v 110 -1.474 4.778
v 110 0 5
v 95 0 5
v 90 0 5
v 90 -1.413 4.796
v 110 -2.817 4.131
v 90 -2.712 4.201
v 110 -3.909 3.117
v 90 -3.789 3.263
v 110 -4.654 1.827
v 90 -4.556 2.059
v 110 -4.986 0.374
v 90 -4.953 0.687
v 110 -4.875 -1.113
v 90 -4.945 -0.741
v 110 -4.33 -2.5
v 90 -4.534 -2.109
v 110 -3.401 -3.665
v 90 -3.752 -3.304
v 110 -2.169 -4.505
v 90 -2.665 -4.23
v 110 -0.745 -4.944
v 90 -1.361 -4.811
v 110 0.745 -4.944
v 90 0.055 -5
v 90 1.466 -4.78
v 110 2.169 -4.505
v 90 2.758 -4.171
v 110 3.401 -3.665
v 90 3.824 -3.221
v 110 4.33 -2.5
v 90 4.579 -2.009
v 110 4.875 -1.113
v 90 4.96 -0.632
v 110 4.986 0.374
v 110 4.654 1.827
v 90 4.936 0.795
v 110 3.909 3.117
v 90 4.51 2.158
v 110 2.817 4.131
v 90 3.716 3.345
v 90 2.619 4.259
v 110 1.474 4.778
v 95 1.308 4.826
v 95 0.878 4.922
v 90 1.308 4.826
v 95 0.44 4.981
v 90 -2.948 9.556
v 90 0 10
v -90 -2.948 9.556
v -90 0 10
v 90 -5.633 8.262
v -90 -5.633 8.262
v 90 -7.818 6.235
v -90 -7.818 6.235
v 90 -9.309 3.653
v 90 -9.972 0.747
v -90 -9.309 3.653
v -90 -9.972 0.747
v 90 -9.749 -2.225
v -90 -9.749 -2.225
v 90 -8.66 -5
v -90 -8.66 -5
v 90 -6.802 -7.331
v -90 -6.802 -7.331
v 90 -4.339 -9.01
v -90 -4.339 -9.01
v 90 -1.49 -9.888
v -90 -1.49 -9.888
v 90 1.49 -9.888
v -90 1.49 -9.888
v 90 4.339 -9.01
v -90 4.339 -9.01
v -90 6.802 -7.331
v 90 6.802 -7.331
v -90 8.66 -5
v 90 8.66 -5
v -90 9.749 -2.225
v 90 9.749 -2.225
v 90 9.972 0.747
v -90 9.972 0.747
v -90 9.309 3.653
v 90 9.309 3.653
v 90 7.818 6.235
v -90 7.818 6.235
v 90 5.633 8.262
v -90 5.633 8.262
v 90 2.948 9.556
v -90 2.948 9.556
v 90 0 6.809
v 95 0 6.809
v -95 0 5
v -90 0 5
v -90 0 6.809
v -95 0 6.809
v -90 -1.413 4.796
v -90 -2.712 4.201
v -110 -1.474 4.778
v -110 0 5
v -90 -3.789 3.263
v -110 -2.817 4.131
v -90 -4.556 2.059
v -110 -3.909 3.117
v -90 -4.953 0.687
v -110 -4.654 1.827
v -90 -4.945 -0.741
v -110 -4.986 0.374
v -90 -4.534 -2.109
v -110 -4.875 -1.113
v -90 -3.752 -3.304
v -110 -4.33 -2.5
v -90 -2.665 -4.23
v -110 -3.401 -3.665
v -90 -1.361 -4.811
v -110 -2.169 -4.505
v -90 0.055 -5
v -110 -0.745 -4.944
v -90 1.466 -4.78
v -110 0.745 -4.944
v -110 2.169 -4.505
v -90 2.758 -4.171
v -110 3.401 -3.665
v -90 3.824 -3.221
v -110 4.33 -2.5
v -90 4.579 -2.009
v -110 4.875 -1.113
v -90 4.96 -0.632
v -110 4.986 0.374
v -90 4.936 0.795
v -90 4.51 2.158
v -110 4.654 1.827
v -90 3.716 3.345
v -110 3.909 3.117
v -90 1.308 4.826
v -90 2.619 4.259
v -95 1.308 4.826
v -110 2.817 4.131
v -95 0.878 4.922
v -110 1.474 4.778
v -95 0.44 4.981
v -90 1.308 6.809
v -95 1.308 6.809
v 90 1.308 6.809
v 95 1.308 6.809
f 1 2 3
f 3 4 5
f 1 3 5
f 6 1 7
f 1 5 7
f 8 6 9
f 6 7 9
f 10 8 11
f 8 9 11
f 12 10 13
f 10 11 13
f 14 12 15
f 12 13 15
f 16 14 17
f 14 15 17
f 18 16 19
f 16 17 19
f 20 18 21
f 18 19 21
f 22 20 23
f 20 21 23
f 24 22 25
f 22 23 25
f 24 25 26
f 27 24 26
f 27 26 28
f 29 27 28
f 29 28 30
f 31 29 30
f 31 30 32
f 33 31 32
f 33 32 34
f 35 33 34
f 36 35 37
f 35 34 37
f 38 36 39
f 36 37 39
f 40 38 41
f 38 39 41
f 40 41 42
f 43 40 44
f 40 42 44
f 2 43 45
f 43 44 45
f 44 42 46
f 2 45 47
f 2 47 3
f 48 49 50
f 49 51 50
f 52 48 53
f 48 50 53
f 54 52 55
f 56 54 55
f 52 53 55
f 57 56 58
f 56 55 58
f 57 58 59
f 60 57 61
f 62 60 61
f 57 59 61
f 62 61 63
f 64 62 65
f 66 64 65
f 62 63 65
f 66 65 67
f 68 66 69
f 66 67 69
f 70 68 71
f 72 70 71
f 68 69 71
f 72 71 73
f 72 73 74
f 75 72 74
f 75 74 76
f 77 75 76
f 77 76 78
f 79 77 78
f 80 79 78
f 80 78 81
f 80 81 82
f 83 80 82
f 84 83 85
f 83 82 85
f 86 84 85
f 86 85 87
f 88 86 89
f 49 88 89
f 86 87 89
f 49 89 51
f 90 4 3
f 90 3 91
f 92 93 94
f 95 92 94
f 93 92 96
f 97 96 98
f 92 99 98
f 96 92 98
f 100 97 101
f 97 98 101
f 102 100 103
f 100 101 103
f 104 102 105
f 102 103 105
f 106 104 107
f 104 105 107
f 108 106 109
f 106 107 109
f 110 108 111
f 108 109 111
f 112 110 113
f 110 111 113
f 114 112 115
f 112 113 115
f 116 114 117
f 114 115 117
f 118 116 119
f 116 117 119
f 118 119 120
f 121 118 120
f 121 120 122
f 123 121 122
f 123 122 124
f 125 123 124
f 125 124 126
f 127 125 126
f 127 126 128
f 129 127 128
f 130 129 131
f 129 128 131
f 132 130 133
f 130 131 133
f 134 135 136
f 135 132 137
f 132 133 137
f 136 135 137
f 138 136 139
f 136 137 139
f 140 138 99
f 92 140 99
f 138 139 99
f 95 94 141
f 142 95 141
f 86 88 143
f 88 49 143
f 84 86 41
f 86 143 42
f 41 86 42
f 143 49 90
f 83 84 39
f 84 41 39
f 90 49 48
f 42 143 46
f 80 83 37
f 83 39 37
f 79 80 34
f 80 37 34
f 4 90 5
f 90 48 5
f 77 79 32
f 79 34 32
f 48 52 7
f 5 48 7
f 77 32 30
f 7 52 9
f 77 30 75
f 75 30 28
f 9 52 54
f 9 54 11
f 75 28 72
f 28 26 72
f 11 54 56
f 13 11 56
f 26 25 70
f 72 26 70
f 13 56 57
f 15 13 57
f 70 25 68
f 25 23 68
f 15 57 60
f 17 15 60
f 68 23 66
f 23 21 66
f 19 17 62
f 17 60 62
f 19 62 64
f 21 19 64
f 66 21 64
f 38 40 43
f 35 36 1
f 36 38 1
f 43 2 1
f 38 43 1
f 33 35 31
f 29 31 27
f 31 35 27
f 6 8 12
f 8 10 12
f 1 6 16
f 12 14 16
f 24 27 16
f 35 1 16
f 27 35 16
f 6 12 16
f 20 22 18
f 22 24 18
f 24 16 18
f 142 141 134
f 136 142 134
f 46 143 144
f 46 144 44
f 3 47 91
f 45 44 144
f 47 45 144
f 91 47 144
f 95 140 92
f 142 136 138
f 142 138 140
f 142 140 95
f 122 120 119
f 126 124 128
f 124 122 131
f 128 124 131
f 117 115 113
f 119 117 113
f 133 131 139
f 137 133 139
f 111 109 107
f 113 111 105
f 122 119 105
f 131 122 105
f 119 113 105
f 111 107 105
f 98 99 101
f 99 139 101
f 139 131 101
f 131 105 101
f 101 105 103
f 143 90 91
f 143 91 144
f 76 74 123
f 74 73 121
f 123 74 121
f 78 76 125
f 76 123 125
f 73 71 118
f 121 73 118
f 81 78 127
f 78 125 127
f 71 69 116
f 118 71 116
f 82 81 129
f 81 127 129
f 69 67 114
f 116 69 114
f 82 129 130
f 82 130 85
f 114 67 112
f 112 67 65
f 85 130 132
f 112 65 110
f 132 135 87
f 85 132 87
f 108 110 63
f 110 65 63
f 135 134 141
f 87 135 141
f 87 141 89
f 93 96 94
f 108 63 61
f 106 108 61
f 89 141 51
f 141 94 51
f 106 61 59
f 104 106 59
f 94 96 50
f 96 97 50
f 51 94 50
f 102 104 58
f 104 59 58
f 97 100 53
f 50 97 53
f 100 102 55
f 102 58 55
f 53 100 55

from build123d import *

# Parameters (mm, degrees)
BOSS_EXTRUDE1_DEPTH = 5


with BuildPart() as part:
    # Sketch1 → Revolve1 (revolve)
    with BuildSketch(Plane(origin=(0, 0, 0), x_dir=(1, 0, 0), z_dir=(0, 1, 0))):
        Polygon((-110, 0), (110, 0), (110, -5), (90, -5), (90, -10), (-90, -10), (-90, -5), (-110, -5), align=None)
    revolve(axis=Axis((-110, 0, 0), (1, 0, 0)))

    # Sketch2 → Boss-Extrude1 (add)
    with BuildSketch(Plane(origin=(90, 0, 0), x_dir=(0, 0, -1), z_dir=(1, 0, 0))):
        with BuildLine():
            Line((-5, 0), (-6.809348939, 0))
            Line((-6.809348939, 0), (-6.809348939, 1.307755756))
            Line((-6.809348939, 1.307755756), (-4.825948081, 1.307755756))
            ThreePointArc((-4.825948081, 1.307755756), (-4.956296016, 0.65964369), (-5, 0))
        make_face()
    boss_extrude1 = extrude(amount=BOSS_EXTRUDE1_DEPTH)

    # Mirror1: Boss-Extrude1 across plane
    add(boss_extrude1.mirror(Plane(origin=(0, 0, 0), x_dir=(0, 0, 1), z_dir=(1, 0, 0))))


solid = part.part
